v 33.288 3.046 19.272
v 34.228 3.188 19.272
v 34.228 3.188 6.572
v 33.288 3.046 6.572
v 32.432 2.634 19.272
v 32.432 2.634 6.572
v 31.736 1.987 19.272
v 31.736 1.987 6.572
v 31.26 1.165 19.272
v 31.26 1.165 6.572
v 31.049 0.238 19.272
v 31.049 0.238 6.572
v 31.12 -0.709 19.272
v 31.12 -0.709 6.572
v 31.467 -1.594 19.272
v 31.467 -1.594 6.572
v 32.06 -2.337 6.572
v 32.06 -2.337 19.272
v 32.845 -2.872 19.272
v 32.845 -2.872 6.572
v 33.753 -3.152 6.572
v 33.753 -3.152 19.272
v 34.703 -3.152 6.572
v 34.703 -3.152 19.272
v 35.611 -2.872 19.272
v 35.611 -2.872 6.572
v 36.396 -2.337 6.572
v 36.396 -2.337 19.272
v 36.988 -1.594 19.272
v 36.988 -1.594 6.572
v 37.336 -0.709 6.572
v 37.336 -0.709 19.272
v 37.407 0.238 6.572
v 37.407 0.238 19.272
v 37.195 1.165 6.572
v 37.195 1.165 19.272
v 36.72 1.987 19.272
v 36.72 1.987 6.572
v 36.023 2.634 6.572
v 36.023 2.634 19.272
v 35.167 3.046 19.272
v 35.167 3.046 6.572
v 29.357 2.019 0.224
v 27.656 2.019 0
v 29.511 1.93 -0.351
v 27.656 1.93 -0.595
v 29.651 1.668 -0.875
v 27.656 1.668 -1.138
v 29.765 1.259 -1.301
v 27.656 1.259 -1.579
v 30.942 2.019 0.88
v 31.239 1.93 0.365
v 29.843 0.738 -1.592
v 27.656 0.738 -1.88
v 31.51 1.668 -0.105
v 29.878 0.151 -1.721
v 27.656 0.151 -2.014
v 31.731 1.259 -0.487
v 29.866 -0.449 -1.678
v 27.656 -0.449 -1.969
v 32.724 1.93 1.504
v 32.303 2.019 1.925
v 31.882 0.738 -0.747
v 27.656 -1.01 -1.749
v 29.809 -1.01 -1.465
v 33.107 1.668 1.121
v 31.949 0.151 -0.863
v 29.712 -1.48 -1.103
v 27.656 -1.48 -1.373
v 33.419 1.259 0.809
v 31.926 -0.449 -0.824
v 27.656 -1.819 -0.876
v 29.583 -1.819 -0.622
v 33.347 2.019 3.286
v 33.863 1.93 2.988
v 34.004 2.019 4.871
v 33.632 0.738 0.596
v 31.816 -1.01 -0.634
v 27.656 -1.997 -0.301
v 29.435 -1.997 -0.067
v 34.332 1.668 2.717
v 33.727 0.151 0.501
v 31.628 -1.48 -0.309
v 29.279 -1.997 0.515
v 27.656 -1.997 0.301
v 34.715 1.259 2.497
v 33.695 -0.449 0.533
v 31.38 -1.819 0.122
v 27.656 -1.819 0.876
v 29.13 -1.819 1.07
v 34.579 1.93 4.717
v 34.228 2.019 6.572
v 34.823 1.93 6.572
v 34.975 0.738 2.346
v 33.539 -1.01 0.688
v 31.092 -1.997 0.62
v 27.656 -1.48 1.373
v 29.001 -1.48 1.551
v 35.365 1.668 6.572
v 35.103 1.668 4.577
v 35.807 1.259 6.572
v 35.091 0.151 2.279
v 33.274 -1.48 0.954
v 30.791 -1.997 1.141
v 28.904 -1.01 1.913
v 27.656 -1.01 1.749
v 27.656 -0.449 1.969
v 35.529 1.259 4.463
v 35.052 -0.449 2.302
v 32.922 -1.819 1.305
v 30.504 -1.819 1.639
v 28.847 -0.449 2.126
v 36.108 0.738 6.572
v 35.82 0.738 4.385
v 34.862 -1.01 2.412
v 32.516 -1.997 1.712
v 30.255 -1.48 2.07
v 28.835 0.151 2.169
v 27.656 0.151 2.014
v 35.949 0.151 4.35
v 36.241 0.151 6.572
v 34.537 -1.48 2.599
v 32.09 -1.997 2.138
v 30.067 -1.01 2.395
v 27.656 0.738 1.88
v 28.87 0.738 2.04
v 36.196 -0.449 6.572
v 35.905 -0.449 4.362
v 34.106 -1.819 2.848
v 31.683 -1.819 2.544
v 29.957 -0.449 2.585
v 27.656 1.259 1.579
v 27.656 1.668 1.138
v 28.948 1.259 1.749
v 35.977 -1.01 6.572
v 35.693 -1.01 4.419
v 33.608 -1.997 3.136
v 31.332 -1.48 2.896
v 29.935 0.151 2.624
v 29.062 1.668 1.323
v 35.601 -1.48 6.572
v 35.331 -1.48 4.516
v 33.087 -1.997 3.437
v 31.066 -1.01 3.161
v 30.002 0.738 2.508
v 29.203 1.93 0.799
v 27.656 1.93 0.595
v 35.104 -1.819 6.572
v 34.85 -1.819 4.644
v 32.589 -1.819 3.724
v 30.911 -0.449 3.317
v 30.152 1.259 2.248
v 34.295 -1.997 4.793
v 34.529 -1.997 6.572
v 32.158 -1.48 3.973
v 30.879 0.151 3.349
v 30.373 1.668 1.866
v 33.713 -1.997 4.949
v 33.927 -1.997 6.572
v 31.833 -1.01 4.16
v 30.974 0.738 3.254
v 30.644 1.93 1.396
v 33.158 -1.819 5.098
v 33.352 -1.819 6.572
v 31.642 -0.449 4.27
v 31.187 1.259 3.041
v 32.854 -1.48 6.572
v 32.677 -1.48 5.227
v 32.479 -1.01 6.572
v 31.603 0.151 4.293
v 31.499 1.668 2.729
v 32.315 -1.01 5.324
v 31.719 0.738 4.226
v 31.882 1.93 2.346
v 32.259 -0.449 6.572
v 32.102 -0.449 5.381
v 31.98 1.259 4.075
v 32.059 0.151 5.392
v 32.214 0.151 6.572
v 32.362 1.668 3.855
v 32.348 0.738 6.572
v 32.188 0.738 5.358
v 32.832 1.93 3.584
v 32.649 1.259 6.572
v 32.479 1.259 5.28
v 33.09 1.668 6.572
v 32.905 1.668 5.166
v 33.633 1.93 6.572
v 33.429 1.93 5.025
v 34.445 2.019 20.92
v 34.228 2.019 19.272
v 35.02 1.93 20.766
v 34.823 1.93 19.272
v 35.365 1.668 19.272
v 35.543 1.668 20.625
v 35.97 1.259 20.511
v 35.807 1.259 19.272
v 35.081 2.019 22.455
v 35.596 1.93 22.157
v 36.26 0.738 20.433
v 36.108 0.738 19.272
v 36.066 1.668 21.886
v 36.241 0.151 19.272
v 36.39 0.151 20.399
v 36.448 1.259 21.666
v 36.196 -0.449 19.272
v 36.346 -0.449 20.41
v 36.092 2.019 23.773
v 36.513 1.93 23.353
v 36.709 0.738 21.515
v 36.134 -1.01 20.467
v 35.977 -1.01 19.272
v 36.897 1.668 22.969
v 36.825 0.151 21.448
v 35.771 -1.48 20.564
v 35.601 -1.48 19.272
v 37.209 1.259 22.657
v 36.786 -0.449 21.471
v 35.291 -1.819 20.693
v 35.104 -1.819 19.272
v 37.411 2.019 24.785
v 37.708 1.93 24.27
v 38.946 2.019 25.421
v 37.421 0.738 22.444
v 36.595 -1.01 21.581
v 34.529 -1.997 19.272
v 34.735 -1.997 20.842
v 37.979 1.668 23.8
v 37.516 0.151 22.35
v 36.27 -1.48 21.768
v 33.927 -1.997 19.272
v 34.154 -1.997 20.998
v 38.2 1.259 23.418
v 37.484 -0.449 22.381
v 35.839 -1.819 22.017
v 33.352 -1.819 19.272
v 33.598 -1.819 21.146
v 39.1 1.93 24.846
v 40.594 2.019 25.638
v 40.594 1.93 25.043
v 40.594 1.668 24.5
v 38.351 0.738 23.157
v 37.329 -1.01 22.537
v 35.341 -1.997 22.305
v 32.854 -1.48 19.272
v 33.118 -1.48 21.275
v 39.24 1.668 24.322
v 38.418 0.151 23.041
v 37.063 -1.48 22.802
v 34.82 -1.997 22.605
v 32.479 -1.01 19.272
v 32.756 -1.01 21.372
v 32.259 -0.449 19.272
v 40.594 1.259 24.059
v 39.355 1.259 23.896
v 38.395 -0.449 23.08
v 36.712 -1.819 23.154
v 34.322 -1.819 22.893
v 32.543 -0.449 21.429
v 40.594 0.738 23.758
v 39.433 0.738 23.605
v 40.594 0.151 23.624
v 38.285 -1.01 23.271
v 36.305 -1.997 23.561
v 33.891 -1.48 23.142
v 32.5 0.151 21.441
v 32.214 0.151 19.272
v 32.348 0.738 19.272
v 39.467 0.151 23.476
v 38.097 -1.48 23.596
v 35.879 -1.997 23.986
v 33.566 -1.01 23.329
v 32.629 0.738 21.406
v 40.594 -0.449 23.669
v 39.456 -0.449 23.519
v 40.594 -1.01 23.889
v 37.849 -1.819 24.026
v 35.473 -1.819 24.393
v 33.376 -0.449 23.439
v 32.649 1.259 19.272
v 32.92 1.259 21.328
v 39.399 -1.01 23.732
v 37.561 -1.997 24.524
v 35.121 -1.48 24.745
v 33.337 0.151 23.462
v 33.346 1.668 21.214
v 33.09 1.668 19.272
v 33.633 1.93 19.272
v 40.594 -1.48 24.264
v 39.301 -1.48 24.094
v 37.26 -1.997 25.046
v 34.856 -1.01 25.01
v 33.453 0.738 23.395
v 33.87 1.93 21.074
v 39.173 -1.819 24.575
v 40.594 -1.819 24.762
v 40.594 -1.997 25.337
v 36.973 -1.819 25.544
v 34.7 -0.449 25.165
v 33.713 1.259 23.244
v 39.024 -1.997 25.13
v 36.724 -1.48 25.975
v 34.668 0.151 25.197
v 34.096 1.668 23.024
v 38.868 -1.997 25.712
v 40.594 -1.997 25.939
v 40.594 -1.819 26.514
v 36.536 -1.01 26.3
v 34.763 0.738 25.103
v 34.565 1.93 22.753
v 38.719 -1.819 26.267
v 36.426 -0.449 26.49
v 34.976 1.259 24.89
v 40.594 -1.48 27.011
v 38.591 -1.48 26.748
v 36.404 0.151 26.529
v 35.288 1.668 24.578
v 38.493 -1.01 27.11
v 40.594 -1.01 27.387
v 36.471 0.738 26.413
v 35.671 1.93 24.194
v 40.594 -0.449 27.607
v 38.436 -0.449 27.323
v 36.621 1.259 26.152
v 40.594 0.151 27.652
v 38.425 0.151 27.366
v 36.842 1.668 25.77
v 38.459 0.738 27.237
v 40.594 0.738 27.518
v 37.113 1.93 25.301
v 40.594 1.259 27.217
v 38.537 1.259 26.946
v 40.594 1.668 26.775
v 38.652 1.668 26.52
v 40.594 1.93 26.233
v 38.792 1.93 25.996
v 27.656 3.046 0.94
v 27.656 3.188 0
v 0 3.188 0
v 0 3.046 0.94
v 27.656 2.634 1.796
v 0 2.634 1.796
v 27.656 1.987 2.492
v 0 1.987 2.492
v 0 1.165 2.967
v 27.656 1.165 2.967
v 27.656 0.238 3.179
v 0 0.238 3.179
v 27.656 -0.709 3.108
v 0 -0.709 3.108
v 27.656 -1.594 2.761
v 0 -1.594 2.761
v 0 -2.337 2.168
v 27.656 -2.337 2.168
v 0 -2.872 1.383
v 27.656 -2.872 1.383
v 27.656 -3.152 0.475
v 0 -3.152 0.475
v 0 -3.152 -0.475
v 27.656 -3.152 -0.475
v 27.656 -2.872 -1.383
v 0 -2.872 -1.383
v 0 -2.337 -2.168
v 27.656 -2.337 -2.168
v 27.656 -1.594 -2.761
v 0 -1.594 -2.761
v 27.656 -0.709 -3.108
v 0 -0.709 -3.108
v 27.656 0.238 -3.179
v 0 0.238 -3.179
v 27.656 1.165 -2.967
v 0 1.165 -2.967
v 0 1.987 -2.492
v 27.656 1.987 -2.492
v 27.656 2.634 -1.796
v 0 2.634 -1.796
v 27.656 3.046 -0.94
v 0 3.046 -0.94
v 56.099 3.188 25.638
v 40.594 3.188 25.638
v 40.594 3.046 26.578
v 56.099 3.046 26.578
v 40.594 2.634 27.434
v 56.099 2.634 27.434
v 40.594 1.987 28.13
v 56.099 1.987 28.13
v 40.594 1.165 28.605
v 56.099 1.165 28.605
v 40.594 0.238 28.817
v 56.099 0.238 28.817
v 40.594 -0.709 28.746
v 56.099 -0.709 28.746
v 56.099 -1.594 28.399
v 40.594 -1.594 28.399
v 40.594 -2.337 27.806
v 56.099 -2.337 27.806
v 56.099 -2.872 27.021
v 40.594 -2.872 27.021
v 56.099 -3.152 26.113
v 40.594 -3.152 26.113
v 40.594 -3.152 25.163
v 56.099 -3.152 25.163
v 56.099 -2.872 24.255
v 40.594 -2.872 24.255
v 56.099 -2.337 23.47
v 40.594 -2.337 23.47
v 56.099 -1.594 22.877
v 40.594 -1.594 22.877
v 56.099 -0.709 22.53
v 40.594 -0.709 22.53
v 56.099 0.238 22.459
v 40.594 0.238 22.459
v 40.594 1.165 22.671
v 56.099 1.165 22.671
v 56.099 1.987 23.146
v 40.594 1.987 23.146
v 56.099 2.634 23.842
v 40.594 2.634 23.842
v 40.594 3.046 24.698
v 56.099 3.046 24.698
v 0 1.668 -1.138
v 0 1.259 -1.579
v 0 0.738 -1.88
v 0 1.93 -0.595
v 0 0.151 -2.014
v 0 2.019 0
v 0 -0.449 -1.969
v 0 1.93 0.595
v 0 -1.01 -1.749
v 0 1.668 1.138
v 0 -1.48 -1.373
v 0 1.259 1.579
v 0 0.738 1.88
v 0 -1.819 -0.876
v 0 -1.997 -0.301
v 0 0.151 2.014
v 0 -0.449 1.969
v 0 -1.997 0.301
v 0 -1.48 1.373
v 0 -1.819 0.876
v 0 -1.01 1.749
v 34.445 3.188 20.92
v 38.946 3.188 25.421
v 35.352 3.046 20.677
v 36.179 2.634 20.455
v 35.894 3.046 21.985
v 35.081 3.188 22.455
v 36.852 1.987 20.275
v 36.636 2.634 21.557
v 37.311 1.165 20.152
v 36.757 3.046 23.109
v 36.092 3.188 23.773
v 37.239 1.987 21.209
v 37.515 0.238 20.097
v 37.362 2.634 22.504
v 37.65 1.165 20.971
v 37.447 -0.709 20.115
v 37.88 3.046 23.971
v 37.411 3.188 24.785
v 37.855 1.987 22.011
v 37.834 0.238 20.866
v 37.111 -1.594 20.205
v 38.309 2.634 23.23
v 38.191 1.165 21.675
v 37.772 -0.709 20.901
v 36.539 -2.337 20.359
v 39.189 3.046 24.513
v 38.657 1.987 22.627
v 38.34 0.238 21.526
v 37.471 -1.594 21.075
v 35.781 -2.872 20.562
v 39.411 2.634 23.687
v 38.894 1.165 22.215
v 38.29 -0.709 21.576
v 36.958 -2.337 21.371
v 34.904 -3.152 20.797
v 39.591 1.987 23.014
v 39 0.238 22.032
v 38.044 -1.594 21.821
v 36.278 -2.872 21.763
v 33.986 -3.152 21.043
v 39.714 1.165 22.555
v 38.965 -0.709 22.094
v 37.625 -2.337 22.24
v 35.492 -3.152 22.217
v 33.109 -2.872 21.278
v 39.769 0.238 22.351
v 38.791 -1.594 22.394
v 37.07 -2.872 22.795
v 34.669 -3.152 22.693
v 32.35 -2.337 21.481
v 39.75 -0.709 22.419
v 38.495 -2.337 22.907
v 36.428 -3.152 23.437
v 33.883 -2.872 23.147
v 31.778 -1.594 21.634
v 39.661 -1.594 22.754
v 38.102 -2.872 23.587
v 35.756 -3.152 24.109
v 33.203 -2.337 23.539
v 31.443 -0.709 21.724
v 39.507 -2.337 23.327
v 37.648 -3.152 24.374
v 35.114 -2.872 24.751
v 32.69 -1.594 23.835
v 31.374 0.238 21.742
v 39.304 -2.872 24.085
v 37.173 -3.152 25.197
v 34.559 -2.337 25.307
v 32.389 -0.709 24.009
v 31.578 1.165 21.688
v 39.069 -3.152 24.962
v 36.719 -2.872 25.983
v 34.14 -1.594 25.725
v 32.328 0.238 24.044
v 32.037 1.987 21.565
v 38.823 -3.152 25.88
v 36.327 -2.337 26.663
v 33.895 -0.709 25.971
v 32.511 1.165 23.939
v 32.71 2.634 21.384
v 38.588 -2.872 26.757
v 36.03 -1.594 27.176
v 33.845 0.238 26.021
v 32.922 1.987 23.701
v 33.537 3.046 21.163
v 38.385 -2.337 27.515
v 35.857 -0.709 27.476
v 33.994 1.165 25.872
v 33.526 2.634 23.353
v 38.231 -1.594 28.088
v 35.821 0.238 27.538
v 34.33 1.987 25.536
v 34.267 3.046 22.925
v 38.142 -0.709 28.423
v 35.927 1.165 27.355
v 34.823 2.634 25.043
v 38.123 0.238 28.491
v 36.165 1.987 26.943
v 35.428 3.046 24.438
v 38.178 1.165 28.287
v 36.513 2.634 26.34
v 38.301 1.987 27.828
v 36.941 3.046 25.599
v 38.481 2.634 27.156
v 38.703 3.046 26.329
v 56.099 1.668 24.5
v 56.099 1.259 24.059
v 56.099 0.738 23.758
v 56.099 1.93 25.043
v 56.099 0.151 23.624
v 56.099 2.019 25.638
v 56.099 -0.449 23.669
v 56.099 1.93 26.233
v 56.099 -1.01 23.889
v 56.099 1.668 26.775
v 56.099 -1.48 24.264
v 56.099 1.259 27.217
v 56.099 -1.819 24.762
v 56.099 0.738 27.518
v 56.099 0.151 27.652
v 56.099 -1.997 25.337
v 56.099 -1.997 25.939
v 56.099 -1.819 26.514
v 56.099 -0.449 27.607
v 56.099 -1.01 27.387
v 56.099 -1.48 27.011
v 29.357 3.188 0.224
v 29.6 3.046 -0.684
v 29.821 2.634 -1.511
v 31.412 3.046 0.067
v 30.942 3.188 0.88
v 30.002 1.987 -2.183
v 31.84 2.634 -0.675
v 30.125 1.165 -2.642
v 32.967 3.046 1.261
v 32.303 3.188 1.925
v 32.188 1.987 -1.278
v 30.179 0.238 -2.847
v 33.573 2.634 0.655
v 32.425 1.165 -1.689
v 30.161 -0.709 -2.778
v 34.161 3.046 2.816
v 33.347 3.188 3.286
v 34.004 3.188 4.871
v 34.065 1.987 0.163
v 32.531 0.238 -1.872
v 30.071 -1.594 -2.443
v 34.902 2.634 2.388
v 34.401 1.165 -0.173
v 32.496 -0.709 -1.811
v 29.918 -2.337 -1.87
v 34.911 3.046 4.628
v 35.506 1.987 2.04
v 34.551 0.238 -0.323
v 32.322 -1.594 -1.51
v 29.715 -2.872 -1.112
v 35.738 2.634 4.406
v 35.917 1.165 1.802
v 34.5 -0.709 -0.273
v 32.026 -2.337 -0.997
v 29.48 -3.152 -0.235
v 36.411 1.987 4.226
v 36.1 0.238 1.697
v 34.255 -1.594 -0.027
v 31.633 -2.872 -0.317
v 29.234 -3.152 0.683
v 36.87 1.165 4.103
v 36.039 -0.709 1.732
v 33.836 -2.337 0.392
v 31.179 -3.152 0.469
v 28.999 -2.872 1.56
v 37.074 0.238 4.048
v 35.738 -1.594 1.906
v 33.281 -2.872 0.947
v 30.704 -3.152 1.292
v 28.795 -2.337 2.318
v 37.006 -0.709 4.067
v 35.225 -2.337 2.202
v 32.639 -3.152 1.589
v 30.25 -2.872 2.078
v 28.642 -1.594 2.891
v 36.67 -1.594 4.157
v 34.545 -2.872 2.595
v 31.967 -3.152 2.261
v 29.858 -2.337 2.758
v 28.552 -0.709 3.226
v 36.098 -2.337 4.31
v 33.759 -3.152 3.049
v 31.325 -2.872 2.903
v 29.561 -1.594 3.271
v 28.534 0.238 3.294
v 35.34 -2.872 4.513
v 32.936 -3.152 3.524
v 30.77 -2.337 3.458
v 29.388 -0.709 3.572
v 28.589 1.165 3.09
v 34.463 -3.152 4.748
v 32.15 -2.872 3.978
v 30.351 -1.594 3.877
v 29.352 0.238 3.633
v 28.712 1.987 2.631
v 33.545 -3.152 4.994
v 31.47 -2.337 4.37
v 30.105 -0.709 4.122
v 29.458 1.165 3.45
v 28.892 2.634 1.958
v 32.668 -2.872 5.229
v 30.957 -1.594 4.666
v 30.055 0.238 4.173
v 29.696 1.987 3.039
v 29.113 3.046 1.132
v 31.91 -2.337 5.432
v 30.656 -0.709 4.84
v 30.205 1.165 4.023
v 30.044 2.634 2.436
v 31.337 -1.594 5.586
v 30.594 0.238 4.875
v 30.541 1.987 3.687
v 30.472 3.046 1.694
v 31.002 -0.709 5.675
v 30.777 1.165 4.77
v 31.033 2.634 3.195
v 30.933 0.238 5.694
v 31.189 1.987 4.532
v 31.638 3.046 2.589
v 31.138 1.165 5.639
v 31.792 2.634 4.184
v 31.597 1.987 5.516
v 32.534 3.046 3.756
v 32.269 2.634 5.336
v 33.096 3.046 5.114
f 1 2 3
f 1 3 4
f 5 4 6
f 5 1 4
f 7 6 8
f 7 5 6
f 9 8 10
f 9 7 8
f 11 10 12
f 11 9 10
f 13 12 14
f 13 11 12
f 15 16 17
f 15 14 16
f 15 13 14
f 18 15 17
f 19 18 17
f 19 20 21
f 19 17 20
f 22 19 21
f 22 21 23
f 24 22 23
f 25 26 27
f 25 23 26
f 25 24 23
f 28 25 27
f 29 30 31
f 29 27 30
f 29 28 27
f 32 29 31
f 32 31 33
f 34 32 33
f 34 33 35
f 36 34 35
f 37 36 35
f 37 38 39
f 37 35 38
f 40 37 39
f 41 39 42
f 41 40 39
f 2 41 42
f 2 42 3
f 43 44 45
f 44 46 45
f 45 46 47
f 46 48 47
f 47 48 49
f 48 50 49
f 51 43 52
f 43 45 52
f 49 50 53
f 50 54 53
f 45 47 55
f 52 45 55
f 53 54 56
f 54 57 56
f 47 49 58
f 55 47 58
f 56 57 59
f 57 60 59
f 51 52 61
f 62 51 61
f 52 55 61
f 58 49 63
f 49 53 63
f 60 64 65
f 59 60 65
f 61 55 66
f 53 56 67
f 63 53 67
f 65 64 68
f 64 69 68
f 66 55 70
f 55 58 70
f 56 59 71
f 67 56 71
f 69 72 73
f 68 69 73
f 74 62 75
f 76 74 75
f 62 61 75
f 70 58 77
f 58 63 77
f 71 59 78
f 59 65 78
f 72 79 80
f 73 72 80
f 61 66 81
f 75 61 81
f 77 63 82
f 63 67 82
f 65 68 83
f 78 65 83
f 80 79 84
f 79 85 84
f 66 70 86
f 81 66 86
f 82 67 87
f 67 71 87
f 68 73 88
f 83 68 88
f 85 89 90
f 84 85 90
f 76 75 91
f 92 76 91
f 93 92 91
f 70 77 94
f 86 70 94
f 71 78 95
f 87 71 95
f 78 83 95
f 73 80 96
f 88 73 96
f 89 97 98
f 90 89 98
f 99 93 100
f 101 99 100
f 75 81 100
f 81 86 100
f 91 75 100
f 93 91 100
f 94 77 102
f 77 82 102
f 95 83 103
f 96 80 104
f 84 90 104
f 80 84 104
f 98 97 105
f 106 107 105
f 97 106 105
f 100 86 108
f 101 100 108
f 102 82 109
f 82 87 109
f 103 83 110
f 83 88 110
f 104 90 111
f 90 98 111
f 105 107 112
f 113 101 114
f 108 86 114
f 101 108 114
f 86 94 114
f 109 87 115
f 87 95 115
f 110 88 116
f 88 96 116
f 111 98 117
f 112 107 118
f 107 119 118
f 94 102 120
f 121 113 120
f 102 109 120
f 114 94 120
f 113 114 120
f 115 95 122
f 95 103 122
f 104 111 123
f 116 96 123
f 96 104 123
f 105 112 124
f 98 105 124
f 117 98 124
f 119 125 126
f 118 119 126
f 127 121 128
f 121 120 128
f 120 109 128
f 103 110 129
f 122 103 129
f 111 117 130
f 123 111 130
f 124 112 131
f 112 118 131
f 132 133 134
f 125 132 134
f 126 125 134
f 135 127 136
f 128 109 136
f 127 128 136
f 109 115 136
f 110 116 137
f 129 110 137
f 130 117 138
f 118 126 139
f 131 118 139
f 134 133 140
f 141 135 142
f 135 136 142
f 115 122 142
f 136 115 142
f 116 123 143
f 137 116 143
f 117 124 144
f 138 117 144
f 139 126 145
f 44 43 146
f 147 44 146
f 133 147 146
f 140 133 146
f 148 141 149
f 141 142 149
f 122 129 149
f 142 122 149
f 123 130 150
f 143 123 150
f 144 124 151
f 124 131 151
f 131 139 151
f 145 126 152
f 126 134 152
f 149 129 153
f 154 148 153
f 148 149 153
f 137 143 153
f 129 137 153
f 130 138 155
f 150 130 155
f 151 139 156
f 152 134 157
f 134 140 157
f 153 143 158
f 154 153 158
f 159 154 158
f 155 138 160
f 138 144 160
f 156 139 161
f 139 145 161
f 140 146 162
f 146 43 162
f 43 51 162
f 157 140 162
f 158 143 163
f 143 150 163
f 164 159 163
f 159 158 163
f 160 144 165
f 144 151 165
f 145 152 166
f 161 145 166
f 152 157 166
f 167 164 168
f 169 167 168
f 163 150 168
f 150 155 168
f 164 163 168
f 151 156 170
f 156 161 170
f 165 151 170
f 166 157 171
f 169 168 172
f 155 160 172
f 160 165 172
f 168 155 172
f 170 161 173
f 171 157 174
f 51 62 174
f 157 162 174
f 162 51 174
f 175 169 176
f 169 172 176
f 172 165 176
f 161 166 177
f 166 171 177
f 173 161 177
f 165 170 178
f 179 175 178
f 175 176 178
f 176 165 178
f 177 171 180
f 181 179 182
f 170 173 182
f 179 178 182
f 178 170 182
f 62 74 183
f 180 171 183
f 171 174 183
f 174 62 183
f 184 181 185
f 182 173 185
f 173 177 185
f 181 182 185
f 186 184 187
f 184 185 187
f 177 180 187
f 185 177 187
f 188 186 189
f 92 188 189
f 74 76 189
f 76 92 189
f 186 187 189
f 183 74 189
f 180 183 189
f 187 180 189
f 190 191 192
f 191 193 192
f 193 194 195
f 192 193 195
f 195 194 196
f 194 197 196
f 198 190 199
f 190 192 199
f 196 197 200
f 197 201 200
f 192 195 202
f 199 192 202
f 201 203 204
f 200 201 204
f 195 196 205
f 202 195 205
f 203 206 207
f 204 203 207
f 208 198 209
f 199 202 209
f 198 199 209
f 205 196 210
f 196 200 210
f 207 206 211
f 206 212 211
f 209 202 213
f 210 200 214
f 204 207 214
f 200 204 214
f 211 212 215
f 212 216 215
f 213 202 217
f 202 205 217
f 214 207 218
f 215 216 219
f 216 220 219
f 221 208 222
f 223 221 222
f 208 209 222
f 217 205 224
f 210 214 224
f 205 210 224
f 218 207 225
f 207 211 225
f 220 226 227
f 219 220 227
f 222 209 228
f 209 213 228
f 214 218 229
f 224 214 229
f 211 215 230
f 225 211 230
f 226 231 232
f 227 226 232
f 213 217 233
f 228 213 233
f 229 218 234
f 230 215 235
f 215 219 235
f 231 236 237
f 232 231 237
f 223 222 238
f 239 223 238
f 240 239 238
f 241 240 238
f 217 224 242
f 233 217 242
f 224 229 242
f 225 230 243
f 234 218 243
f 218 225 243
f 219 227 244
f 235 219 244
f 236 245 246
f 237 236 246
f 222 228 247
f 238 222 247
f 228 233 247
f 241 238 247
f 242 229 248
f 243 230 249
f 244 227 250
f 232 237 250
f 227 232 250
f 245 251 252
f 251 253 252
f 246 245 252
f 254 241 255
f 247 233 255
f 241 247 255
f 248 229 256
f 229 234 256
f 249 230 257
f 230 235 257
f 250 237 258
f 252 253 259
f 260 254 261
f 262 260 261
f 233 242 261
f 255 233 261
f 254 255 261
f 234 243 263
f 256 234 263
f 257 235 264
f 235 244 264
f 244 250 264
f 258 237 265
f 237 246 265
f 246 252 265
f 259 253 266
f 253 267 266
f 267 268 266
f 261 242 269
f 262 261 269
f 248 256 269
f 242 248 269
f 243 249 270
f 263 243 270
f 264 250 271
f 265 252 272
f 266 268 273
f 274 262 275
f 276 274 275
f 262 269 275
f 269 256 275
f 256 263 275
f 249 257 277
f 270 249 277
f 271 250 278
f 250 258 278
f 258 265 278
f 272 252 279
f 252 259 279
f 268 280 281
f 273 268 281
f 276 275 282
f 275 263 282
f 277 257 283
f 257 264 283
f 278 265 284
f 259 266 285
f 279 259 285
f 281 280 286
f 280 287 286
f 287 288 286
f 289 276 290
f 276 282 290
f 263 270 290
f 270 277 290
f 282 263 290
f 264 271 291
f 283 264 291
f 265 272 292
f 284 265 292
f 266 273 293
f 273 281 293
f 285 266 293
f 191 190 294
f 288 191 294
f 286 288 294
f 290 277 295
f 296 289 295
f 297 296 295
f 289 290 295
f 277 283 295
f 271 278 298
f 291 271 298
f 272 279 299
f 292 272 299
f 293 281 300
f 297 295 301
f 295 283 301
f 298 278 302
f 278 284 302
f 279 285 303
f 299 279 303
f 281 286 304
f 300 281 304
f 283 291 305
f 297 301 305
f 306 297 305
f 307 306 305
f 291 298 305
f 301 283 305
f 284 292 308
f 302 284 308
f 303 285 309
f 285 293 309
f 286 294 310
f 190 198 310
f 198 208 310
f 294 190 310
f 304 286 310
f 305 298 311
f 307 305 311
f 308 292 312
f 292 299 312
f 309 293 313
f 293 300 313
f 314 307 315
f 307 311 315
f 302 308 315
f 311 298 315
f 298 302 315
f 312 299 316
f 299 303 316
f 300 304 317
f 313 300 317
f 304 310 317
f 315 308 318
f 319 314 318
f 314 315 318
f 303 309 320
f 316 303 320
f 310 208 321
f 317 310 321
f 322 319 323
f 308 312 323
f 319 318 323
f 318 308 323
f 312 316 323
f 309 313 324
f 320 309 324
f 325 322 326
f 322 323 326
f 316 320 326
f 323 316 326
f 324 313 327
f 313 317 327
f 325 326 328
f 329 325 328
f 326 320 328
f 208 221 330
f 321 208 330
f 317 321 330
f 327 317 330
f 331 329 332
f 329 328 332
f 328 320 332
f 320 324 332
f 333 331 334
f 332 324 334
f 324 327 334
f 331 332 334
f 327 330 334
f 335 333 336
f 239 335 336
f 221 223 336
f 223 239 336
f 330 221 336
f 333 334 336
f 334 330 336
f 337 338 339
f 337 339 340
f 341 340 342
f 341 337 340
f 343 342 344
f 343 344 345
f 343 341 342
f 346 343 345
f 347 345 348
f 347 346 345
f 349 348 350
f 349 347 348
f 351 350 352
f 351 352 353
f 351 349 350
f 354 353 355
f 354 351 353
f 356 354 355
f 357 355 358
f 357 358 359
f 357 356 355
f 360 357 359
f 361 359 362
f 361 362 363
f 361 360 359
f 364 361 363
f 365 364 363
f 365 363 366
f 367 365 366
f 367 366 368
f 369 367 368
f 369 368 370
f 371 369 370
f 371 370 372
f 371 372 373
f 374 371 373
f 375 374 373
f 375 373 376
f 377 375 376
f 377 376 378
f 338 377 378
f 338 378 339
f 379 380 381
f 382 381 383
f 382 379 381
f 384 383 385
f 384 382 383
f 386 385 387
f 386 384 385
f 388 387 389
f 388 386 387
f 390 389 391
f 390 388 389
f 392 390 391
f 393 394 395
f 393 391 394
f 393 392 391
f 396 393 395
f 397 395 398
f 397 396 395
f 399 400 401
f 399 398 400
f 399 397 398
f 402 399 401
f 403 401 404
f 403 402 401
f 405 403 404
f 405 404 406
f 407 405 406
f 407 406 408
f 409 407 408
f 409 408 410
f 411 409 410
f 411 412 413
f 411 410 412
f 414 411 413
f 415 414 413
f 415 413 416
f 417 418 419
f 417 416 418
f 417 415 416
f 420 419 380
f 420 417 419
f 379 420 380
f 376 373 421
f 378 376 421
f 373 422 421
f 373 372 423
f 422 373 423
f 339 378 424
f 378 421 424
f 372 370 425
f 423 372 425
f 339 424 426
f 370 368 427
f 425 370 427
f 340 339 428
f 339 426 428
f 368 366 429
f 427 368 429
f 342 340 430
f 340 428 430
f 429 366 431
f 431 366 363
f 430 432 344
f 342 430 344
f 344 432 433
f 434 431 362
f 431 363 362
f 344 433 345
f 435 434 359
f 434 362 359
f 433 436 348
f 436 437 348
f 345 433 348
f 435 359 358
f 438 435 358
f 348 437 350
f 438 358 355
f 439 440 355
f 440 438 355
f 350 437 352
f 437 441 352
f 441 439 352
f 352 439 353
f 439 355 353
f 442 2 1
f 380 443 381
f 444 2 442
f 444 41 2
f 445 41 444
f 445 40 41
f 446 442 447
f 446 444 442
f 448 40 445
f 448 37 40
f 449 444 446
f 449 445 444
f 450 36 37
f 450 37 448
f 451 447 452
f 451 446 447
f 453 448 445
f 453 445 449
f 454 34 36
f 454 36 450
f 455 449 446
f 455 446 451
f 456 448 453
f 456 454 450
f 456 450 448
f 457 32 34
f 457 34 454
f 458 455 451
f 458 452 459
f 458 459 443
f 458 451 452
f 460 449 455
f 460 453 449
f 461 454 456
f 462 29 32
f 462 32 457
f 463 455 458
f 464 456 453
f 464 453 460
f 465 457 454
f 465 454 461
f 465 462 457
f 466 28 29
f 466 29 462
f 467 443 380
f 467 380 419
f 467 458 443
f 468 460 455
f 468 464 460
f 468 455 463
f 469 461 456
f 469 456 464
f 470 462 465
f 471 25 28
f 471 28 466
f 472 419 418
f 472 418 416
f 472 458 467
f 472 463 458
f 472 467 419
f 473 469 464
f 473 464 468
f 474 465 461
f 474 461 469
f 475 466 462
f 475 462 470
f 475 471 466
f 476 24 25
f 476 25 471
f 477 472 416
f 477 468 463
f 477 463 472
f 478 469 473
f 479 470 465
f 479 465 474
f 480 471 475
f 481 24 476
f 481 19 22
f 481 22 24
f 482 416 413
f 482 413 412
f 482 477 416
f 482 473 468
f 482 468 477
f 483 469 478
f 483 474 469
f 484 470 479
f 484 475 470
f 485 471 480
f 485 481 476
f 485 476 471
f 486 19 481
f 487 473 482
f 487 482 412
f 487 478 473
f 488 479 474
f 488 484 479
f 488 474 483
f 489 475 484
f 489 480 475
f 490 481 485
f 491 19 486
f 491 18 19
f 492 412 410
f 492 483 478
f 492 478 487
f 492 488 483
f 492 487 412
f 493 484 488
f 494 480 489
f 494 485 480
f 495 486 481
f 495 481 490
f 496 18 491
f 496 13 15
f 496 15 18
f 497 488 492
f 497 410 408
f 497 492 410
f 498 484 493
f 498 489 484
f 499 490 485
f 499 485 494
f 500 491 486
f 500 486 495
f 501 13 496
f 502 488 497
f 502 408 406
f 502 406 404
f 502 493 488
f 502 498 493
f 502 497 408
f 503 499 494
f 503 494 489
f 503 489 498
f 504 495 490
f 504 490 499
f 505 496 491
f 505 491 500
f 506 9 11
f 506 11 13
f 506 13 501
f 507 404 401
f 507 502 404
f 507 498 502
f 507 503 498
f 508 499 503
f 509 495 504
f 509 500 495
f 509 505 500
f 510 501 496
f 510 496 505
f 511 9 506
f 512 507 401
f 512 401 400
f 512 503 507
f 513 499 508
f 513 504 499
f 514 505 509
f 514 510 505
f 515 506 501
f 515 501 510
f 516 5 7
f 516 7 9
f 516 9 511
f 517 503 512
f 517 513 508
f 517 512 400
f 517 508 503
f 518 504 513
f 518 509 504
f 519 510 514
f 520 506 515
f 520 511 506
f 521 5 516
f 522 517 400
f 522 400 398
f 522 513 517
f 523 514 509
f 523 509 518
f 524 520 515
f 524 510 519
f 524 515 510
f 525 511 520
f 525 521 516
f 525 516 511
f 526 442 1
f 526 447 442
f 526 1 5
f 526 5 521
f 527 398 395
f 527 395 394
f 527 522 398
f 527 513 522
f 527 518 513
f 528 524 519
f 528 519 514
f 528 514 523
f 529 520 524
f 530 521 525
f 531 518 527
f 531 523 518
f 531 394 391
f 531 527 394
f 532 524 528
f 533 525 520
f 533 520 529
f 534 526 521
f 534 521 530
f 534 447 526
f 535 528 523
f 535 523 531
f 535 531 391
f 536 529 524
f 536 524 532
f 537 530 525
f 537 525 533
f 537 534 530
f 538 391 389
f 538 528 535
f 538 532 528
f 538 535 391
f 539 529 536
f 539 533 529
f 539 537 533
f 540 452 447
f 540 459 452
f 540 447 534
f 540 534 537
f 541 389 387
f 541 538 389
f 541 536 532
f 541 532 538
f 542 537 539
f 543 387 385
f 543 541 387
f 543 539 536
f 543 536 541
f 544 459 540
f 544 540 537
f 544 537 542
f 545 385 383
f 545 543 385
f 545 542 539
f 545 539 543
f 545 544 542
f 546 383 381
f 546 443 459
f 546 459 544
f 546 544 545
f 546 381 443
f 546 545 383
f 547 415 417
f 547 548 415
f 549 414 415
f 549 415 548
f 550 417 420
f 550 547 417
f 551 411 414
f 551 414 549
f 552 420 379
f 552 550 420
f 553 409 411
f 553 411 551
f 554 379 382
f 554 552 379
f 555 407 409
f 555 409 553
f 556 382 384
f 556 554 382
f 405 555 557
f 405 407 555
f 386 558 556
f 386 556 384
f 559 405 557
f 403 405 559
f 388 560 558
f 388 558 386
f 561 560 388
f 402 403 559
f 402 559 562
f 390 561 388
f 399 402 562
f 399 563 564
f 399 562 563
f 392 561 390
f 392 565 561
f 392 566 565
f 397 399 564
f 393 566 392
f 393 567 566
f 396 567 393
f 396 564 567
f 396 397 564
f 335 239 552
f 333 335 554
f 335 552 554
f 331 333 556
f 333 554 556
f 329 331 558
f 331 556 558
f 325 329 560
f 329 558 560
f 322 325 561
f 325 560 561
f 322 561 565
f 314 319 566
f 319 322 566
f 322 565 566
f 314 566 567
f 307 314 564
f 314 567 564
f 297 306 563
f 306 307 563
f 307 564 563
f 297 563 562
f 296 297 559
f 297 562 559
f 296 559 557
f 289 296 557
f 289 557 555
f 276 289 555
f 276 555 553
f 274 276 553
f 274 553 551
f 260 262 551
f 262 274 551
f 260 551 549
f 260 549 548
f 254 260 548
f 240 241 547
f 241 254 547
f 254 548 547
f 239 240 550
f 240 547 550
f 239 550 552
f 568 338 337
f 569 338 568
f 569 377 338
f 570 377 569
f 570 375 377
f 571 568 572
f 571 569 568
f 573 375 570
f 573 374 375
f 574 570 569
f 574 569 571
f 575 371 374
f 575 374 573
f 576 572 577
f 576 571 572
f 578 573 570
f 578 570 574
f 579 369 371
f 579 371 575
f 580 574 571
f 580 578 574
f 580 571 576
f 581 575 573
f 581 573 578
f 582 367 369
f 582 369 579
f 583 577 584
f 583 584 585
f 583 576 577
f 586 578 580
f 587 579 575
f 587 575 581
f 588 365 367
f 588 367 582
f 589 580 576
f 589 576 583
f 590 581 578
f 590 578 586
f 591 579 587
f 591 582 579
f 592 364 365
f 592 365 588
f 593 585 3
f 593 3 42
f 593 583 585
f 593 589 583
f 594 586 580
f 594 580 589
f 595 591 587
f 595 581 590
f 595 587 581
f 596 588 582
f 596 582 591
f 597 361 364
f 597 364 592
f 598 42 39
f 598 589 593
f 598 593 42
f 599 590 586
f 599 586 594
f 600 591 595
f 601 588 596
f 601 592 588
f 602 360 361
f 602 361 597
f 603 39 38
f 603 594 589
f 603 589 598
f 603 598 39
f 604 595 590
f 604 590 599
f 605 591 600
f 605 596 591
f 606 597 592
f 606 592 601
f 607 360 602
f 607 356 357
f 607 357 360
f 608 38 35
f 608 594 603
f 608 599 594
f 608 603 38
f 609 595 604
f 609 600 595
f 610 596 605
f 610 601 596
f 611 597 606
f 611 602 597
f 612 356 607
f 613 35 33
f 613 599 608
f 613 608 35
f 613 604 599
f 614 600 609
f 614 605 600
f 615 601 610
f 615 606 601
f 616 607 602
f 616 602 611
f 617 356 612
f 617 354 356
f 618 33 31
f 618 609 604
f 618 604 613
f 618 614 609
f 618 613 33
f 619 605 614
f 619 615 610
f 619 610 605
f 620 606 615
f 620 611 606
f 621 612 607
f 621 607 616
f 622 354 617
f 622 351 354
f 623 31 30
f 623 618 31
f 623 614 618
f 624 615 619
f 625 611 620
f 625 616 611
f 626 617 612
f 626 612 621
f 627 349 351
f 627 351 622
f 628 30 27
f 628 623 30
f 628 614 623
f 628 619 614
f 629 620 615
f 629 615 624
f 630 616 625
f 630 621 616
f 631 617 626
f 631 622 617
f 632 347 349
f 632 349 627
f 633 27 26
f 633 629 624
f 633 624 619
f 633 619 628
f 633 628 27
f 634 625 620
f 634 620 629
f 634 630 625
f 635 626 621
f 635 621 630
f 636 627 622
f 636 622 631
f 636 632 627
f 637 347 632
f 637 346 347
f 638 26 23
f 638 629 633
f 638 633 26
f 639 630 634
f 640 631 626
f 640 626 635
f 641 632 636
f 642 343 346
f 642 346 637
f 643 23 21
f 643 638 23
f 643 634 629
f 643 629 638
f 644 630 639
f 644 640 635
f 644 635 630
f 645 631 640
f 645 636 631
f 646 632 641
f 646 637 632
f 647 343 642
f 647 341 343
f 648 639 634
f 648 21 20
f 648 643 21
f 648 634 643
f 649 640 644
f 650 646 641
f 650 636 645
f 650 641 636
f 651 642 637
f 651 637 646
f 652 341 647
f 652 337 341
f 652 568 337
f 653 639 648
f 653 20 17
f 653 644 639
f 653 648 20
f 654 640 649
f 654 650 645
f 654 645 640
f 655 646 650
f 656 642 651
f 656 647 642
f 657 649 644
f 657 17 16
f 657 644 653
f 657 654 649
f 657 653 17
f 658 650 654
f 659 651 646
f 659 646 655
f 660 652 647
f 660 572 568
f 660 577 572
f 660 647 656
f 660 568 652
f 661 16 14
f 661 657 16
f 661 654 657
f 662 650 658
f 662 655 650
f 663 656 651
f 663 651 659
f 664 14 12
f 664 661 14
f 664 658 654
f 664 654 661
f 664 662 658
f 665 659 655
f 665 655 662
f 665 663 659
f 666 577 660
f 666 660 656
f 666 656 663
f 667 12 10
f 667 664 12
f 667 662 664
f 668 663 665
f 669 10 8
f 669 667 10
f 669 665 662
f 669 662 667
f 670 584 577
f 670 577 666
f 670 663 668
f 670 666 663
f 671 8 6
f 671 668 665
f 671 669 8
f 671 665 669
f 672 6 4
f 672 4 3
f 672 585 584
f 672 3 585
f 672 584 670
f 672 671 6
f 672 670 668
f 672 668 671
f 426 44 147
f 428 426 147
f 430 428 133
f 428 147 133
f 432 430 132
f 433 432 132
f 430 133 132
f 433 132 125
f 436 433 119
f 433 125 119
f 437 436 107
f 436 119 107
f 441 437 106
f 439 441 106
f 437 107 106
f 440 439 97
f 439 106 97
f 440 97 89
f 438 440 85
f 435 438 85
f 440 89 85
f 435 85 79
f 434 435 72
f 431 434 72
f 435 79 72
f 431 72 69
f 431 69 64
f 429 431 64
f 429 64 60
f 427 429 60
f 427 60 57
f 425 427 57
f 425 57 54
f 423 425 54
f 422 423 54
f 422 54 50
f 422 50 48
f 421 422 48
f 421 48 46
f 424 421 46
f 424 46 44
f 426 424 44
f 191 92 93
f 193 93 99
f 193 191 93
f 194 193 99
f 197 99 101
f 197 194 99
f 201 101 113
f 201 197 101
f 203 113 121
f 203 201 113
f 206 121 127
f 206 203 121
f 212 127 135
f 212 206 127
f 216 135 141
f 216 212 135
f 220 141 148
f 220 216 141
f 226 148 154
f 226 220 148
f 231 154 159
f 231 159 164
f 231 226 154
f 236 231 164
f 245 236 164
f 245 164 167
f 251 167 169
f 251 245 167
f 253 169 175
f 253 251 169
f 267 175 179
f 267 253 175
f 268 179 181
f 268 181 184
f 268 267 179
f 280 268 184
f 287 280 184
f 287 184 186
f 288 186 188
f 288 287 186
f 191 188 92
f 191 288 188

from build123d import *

# Parameters (mm, degrees)
F0_R   = 3.1877
F0_R_2 = 2.0193


with BuildPart() as f2:
    # F2: sweep along a path in F1
    with BuildLine(Plane.XZ) as f2_path:
        Line((0, 0), (27.655674, 0))
        ThreePointArc((27.655674, 0), (32.302863, 1.924929), (34.227792, 6.572118))
        Line((34.227792, 6.572118), (34.227792, 19.272118))
        ThreePointArc((34.227792, 19.272118), (36.092292, 23.773419), (40.593592, 25.637919))
        Line((40.593592, 25.637919), (56.098651, 25.637919))
    # F0 (on Right) → F2 (sweep)
    with BuildSketch(Plane.YZ):
        Circle(F0_R)
        Circle(F0_R_2, mode=Mode.SUBTRACT)
    sweep(path=f2_path.line)


solid = f2.part
